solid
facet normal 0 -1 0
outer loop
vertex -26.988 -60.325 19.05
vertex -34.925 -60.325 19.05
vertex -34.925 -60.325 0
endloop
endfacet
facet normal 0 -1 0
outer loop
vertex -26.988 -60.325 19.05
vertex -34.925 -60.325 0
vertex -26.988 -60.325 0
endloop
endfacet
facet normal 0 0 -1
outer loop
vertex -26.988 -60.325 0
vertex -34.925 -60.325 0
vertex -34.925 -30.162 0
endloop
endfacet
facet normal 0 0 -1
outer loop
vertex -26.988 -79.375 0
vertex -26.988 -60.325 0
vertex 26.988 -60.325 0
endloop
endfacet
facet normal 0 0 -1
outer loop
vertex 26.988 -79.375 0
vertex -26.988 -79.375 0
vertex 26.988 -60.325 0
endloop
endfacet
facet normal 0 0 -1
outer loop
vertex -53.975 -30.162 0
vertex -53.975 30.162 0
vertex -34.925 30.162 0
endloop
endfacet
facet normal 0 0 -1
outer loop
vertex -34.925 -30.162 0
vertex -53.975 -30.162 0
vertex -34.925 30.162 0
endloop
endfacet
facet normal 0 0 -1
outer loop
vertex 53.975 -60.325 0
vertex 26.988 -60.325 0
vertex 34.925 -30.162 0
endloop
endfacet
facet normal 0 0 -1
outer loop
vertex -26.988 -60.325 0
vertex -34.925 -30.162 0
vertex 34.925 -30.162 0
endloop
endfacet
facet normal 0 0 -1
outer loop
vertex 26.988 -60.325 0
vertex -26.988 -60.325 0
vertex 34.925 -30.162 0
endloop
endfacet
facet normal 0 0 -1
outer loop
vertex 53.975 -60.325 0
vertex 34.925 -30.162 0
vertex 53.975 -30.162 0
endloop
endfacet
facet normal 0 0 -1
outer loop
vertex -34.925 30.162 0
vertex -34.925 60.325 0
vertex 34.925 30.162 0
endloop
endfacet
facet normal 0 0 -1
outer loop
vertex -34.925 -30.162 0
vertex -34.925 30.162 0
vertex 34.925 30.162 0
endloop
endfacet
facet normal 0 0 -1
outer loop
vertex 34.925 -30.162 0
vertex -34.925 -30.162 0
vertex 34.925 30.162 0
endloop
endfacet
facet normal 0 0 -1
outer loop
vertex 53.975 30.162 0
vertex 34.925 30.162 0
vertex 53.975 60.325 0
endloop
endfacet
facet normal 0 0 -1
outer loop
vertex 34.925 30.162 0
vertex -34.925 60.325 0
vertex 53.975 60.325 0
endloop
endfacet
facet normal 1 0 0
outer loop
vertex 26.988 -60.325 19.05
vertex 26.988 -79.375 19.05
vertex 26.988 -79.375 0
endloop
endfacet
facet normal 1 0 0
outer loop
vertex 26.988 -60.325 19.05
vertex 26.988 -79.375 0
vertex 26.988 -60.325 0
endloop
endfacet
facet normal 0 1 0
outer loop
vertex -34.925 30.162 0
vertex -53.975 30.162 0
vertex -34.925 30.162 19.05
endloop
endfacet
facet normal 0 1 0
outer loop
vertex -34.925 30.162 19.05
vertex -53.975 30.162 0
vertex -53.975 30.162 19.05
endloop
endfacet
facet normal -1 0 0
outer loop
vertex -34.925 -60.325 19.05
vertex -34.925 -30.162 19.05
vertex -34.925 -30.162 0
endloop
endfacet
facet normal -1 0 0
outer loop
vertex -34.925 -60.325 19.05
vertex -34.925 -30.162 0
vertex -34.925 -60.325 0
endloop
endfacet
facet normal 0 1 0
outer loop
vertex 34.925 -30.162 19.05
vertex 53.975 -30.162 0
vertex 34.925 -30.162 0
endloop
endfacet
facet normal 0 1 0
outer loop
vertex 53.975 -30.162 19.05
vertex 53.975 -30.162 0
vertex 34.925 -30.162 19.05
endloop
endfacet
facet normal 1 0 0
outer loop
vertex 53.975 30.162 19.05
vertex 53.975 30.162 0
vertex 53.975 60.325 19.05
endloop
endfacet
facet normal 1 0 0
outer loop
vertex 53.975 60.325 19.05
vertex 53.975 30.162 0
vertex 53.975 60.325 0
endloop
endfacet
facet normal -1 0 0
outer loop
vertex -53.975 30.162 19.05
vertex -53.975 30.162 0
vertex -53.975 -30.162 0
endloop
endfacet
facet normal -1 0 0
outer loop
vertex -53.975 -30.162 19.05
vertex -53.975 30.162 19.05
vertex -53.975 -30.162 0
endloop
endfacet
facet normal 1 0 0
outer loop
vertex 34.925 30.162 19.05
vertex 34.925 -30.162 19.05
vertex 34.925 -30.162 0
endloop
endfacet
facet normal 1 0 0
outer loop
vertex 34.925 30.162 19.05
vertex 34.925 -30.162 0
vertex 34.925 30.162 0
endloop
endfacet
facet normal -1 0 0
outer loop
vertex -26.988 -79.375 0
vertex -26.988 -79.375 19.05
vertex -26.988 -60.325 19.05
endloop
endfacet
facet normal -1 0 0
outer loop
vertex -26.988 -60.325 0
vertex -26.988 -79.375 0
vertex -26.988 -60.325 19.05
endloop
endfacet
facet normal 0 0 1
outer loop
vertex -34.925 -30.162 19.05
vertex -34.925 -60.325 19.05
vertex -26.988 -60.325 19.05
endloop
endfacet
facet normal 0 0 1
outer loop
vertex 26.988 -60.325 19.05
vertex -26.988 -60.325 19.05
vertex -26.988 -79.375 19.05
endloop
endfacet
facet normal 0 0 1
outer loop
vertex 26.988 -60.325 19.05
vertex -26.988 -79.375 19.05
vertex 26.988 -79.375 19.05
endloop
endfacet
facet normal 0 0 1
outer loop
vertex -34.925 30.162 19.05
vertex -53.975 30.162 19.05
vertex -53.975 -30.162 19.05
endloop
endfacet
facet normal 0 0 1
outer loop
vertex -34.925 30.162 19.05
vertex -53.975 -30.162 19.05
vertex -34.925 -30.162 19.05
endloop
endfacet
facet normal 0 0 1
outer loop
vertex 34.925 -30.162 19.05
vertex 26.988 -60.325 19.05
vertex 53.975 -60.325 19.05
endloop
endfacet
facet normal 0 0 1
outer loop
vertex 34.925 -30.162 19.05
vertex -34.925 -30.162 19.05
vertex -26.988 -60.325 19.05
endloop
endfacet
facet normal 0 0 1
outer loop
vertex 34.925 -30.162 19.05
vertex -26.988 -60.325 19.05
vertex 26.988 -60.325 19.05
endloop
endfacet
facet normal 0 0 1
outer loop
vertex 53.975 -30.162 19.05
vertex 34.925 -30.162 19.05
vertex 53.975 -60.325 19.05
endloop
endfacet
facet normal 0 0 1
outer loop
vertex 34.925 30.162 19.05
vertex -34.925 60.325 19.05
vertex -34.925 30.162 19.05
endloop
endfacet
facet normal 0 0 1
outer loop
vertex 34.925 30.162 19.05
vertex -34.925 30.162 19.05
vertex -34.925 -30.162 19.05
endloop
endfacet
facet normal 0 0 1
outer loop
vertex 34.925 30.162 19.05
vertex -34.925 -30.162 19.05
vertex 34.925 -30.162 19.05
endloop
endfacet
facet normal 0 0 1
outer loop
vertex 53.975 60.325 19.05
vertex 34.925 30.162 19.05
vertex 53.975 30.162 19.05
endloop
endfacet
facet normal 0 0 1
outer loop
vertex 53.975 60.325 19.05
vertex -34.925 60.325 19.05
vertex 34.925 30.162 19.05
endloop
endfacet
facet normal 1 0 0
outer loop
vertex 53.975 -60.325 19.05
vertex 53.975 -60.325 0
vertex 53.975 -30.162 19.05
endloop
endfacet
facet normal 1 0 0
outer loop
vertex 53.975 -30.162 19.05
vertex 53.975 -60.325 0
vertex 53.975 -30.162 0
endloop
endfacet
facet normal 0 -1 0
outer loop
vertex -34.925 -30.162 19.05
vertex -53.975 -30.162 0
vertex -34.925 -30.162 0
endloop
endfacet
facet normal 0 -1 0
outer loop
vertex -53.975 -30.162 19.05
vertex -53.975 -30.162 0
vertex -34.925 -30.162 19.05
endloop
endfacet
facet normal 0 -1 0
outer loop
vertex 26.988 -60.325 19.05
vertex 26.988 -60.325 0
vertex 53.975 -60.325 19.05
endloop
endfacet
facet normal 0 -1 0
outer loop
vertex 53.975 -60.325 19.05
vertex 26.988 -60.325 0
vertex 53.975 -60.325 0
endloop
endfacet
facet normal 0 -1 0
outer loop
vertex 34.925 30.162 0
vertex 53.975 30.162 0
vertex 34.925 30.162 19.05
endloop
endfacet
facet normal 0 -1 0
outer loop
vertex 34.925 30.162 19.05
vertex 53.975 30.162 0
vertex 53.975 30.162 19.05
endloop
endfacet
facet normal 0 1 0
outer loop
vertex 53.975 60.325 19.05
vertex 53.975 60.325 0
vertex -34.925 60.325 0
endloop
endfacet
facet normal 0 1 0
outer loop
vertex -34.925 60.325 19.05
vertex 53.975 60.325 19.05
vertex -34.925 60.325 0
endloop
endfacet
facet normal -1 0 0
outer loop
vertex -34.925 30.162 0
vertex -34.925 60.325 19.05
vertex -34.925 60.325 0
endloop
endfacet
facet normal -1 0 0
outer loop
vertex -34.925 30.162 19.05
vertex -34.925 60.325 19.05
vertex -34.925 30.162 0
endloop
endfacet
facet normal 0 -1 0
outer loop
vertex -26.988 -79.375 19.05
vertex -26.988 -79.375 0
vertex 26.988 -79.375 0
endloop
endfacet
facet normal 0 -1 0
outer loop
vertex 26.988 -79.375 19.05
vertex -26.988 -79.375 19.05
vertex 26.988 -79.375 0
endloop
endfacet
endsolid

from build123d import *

# Parameters (mm, degrees)
F0_W     = 53.975
F0_H     = 19.05
F1_DEPTH = 19.05
F2_W     = 60.325
F2_H     = 19.05
F3_DEPTH = 19.05
F4_W     = 30.1625
F4_H     = 19.05
F5_DEPTH = 19.05


# Not quite as in the source:
# - a length typed as a fraction of an inch, garbled in the dataset ("3 / 203.2 mm" for 3/8 in), is restored


with BuildPart() as f1:
    # F0 (on Top) → F1 (new body)
    with BuildSketch(Plane.XY):
        Polygon((53.975, -60.325), (53.975, 60.325), (-53.975, 60.325), (-53.975, -60.325), (-26.9875, -60.325), (-26.9875, -41.275), (26.9875, -41.275), (26.9875, -60.325), align=None)
        with Locations((0, -69.85)):
            Rectangle(F0_W, F0_H)
        with Locations((0, -50.8)):
            Rectangle(F0_W, F0_H)
    extrude(amount=F1_DEPTH)

    # F2 (on face) → F3 (cut)
    with BuildSketch(Plane.YZ.offset(53.975)):
        with Locations((0, 9.525)):
            Rectangle(F2_W, F2_H)
    extrude(amount=-F3_DEPTH, mode=Mode.SUBTRACT)

    # F4 (on face) → F5 (cut)
    with BuildSketch(Plane(origin=(-53.975, 0, 0), x_dir=(0, -1, 0), z_dir=(-1, 0, 0))):
        with Locations((-45.24375, 9.525)):
            Rectangle(F4_W, F4_H)
        with Locations((45.24375, 9.525)):
            Rectangle(F4_W, F4_H)
    extrude(amount=-F5_DEPTH, mode=Mode.SUBTRACT)


solid = f1.part
